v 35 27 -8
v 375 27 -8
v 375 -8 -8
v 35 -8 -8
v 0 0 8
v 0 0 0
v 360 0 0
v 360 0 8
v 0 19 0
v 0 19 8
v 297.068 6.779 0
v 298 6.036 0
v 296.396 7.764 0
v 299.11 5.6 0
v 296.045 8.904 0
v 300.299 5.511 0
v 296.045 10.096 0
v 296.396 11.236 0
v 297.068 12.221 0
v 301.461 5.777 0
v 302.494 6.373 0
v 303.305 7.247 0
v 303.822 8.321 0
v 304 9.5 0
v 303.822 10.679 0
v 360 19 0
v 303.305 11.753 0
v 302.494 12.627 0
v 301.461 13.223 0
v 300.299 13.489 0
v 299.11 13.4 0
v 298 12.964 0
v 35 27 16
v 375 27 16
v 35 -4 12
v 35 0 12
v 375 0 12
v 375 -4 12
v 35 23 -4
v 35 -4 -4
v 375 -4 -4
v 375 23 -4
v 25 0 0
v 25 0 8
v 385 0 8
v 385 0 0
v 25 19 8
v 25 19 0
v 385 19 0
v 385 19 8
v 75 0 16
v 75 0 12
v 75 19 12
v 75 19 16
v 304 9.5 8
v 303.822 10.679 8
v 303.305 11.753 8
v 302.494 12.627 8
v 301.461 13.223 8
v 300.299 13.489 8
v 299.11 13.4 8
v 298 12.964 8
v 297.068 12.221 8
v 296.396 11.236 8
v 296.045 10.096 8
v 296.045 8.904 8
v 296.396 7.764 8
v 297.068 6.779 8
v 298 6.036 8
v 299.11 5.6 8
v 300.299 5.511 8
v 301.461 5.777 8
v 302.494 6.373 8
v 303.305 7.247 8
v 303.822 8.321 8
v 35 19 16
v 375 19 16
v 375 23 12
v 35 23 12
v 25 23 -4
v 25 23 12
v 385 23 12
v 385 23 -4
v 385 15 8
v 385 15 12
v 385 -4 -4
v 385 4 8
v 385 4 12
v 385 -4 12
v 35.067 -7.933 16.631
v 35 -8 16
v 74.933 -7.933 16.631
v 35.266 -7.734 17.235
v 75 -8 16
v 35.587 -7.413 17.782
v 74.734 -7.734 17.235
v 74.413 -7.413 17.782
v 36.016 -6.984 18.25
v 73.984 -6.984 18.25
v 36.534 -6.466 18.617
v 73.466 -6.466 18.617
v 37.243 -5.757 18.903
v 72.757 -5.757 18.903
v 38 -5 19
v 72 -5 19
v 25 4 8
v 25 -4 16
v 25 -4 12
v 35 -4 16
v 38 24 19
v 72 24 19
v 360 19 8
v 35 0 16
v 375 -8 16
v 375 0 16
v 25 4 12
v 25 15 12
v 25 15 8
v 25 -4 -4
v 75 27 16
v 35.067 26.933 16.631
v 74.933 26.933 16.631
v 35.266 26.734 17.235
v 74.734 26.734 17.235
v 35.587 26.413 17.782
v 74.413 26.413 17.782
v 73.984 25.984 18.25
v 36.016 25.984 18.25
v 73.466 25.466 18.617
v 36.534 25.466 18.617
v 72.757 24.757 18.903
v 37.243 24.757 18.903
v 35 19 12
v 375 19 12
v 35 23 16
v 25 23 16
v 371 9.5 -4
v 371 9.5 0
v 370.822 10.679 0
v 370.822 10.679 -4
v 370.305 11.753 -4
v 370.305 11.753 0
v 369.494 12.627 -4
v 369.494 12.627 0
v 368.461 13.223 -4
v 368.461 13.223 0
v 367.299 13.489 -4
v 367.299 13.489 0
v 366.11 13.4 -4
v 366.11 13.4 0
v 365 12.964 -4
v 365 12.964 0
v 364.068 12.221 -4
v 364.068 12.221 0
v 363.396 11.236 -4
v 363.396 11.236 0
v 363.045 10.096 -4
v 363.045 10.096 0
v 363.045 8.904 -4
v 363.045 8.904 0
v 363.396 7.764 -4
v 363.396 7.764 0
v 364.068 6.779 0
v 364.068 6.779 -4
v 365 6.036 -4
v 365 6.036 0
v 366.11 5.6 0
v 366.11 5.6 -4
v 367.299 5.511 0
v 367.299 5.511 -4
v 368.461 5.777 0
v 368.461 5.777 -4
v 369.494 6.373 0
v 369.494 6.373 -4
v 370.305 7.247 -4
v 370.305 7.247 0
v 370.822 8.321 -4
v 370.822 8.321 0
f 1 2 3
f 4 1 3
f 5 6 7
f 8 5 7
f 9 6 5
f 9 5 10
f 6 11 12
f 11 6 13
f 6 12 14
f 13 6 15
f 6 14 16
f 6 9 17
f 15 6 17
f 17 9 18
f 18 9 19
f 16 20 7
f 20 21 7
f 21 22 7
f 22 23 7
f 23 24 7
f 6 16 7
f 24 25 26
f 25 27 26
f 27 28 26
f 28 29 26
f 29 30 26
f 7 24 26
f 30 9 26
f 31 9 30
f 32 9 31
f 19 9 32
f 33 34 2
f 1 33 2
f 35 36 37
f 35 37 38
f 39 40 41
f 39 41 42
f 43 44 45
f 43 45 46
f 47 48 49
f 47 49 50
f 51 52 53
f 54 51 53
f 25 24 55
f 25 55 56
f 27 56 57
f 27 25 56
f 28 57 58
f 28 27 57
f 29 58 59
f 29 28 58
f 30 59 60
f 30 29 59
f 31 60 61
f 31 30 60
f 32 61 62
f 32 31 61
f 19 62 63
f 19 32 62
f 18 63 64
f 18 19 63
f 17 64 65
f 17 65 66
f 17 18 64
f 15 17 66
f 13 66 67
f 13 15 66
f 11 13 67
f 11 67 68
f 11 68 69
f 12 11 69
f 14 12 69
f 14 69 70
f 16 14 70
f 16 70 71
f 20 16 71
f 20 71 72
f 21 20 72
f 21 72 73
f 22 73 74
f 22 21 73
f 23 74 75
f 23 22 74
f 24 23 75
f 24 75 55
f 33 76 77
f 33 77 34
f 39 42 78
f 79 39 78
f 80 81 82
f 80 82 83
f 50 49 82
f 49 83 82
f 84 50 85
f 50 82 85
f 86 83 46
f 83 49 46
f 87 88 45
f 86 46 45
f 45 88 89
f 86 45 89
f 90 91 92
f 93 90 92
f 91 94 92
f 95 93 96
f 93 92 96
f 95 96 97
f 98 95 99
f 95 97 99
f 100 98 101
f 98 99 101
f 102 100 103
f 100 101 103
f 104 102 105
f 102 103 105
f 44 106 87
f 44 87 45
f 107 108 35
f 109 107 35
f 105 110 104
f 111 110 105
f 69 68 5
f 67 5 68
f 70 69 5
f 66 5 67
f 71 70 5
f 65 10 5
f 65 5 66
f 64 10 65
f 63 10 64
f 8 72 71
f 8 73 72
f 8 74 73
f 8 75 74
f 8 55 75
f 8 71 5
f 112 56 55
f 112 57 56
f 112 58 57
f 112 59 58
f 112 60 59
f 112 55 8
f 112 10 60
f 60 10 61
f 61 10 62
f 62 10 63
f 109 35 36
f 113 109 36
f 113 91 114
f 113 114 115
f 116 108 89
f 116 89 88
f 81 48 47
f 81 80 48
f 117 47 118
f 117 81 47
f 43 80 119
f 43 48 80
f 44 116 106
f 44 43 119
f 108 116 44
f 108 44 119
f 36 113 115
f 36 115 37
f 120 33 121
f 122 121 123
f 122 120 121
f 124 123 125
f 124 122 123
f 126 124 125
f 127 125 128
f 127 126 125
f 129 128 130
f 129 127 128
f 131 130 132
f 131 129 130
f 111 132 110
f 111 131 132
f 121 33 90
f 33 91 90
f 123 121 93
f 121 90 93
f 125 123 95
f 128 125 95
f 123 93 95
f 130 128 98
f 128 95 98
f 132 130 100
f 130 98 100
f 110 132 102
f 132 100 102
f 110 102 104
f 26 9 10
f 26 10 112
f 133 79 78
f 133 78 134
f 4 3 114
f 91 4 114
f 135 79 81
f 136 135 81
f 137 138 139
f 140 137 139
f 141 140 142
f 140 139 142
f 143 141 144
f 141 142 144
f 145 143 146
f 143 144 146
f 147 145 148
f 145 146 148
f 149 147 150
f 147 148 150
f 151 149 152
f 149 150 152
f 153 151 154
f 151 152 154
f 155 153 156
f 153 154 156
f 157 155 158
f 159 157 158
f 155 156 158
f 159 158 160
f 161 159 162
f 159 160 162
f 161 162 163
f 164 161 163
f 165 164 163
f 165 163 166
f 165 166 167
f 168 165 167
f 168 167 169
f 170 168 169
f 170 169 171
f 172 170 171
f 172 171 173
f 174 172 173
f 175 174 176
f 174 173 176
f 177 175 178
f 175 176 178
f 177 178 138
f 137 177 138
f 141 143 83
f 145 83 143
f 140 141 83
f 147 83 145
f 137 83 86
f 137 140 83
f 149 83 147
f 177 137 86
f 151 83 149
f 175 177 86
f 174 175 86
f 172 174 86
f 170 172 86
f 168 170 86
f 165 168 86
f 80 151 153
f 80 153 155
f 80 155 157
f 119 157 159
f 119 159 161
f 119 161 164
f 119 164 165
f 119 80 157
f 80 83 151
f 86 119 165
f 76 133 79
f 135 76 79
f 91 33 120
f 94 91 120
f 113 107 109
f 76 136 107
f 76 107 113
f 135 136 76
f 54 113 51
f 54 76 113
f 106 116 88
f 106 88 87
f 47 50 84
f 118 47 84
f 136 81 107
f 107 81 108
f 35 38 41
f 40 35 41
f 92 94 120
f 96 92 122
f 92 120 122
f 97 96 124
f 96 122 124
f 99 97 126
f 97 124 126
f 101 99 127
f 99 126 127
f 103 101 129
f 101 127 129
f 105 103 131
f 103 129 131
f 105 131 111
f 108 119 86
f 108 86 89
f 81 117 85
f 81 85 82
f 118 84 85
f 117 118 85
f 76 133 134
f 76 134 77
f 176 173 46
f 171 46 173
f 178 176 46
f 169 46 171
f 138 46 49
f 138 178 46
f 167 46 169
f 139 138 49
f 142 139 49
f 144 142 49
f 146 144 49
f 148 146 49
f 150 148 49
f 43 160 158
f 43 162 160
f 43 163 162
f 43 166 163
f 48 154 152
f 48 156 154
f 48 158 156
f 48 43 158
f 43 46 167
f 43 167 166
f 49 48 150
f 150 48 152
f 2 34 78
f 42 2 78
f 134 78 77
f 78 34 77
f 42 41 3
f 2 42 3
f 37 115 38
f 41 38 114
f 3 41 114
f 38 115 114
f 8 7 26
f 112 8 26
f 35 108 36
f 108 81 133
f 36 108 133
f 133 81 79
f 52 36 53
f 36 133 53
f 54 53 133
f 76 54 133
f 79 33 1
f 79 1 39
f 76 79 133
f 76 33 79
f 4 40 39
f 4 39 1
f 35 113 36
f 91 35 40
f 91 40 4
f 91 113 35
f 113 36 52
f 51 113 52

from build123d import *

# Parameters (mm, degrees)
F0_W      = 360
F0_H      = 19
F0_R      = 4
F1_DEPTH  = 8
F4_DEPTH  = 360
F7_DEPTH  = 340
F8_W      = 50
F8_H      = 11
F9_DEPTH  = 4
F10_W     = 40
F10_H     = 8
F10_H_2   = 19
F11_DEPTH = 3
F12_R     = 2.99999
F13_R     = 4
F14_DEPTH = 4


# Not quite as in the source:
# - a fillet or chamfer is up to 0.001 mm smaller than in the source, because OpenCascade refuses the exact size


with BuildPart() as f1:
    # F0 (on Top) → F1 (new body)
    with BuildSketch(Plane.XY):
        with Locations((180, 9.5)):
            Rectangle(F0_W, F0_H)
        with Locations((300, 9.5)):
            Circle(F0_R, mode=Mode.SUBTRACT)
    extrude(amount=F1_DEPTH)


with BuildPart() as f4:
    # F3 (on offset) → F4 (new body)
    with BuildSketch(Plane(origin=(25, 0, 0), x_dir=(0, -1, 0), z_dir=(-1, 0, 0))):
        Polygon((0, 0), (-19, 0), (-19, 8), (-15, 8), (-15, 12), (-23, 12), (-23, -4), (4, -4), (4, 12), (-4, 12), (-4, 8), (0, 8), align=None)
    extrude(amount=-F4_DEPTH)

    # F13 (on face) → F14 (cut)
    with BuildSketch(Plane.XY):
        with Locations((367, 9.5)):
            Circle(F13_R)
    extrude(amount=-F14_DEPTH, mode=Mode.SUBTRACT)


with BuildPart() as f7:
    # F6 (on offset) → F7 (new body)
    with BuildSketch(Plane(origin=(35, 0, 0), x_dir=(0, -1, 0), z_dir=(-1, 0, 0))):
        Polygon((-27, 16), (-27, -8), (8, -8), (8, 16), (0, 16), (0, 12), (4, 12), (4, -4), (-23, -4), (-23, 12), (-19, 12), (-19, 16), align=None)
    extrude(amount=-F7_DEPTH)


with BuildPart() as f9:
    # F8 (on face) → F9 (new body)
    with BuildSketch(Plane.XY.offset(12)):
        Polygon((35, 23), (25, 23), (25, 15), (75, 15), (75, 19), (35, 19), align=None)
        with Locations((50, 9.5)):
            Rectangle(F8_W, F8_H)
        Polygon((75, 4), (25, 4), (25, -4), (35, -4), (35, 0), (75, 0), align=None)
    extrude(amount=F9_DEPTH)


with BuildPart() as f11:
    # F10 (on face) → F11 (new body)
    with BuildSketch(Plane.XY.offset(16)):
        with Locations((55, 23)):
            Rectangle(F10_W, F10_H)
        with Locations((55, 9.5)):
            Rectangle(F10_W, F10_H_2)
        with Locations((55, -4)):
            Rectangle(F10_W, F10_H)
    extrude(amount=F11_DEPTH)

    # F12 (radius 3 in the source; OpenCascade refuses exactly that, so slightly less here)
    f12_edges = [f11.edges().sort_by_distance(p)[0] for p in [
        (55, -8, 19),
        (35, 9.5, 19),
        (55, 27, 19),
        (75, 9.5, 19),
    ]]
    fillet(f12_edges, radius=F12_R)


solid = Compound([f1.part, f4.part, f7.part, f9.part, f11.part])
